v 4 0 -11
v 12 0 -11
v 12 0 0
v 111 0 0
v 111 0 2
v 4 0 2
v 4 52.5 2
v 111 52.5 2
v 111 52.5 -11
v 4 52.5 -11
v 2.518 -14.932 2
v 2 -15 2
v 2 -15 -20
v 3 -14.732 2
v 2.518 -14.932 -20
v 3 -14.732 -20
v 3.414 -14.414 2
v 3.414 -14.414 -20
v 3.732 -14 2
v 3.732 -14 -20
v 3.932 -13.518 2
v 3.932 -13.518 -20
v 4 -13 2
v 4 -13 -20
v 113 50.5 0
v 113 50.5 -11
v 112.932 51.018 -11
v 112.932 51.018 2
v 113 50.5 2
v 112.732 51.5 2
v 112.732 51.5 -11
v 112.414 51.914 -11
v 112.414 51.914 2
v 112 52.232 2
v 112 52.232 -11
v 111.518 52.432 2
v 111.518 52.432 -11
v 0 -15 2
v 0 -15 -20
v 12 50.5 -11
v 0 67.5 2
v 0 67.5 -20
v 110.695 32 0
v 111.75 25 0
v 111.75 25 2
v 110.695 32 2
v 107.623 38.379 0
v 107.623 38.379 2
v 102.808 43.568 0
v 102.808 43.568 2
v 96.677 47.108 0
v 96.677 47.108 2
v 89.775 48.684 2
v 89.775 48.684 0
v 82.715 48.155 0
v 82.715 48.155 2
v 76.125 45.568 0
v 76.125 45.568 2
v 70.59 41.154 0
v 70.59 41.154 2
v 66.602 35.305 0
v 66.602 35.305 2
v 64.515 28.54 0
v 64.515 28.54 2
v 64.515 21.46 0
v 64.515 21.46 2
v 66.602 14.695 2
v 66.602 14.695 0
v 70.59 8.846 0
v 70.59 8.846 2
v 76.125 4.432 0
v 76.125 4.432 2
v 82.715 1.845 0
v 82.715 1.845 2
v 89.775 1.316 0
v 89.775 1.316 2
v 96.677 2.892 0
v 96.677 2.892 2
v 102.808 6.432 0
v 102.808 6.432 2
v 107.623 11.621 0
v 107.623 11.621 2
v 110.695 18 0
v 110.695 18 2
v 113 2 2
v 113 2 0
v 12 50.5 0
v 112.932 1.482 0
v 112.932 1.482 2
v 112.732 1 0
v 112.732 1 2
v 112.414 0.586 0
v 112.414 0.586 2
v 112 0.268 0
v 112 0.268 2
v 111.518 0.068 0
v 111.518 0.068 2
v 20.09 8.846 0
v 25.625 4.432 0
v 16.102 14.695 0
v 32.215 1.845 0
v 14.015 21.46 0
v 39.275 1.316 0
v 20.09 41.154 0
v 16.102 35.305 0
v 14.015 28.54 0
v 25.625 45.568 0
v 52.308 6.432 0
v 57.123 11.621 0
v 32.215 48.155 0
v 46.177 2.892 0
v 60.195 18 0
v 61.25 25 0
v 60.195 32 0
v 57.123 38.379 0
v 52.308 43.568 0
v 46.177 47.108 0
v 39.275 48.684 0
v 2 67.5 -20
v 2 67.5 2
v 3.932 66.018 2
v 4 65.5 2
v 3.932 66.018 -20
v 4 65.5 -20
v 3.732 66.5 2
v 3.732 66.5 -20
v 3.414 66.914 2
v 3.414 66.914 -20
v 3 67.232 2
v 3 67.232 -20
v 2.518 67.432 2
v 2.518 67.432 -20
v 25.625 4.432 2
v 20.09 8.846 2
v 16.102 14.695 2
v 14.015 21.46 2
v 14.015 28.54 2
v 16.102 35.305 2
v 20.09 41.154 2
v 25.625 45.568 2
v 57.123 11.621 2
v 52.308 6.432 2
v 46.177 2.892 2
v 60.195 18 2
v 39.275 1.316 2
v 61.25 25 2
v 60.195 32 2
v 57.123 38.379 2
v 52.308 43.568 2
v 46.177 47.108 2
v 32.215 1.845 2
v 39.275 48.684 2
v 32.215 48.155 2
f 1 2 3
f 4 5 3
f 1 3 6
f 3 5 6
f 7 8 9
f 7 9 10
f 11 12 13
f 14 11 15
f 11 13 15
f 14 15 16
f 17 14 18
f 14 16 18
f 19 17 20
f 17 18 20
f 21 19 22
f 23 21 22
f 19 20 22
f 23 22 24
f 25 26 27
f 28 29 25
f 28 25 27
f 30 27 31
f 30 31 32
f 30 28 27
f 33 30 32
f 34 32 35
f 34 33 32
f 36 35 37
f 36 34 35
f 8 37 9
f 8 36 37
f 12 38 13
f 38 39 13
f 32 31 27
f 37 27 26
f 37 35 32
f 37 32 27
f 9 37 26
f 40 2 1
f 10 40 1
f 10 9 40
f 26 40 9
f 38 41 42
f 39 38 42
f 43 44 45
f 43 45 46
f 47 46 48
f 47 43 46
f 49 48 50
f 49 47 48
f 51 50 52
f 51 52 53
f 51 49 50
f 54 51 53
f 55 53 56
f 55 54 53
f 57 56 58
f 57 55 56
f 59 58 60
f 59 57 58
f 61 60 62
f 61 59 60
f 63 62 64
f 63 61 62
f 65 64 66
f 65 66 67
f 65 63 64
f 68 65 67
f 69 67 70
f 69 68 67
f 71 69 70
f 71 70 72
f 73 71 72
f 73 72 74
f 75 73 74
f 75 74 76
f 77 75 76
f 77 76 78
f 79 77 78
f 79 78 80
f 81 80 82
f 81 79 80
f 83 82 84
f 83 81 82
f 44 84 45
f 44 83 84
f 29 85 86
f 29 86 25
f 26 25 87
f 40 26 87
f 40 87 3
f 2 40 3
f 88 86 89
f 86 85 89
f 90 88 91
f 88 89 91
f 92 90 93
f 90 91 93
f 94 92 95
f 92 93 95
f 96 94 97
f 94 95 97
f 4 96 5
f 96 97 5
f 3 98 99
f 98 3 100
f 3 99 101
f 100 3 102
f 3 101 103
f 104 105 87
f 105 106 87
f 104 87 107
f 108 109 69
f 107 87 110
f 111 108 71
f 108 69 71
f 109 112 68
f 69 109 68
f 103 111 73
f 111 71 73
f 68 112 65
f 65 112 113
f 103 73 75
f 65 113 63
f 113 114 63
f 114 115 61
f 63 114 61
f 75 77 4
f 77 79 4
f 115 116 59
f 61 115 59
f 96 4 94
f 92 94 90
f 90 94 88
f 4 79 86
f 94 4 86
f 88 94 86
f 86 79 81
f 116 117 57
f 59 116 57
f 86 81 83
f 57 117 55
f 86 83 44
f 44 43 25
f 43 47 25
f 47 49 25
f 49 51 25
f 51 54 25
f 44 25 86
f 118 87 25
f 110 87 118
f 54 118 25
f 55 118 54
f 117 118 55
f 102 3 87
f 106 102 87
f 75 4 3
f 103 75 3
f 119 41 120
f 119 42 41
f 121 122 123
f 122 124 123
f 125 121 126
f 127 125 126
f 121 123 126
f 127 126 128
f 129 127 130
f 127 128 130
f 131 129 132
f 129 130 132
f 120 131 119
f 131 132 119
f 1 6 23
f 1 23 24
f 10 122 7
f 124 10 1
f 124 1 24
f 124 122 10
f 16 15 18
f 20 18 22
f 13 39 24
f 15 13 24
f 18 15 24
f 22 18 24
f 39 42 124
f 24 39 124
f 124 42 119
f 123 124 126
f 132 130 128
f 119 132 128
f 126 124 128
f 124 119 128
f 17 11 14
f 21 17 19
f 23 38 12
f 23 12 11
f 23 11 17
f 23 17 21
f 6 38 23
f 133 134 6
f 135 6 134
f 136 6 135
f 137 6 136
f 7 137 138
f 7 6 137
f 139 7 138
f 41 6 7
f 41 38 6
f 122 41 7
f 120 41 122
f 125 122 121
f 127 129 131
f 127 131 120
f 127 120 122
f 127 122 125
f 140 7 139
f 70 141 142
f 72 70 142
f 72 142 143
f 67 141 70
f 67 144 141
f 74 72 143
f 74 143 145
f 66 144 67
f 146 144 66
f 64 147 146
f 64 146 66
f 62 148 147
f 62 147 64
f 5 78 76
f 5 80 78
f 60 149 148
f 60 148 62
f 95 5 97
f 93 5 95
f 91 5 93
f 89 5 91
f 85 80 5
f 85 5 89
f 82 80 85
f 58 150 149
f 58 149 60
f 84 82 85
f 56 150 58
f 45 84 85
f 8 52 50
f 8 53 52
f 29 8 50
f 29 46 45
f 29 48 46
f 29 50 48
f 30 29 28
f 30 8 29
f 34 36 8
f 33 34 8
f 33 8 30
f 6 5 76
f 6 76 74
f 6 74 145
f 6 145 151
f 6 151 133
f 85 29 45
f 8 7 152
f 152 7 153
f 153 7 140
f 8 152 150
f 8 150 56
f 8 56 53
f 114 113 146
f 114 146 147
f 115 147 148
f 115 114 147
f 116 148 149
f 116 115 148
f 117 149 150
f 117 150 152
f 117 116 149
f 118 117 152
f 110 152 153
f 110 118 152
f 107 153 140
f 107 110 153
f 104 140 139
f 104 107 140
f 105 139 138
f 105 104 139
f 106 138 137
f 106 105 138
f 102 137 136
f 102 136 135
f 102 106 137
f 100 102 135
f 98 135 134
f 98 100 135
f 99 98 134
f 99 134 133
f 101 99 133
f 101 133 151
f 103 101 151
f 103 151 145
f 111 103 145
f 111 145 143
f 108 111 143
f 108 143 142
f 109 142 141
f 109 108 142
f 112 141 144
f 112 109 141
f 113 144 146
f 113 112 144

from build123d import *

# Parameters (mm, degrees)
SKETCH_1_W           = 113
SKETCH_1_H           = 52.5
SKETCH_1_R           = 23.75
EXTRUDE_1_DEPTH      = 2
SKETCH_2_W           = 113
SKETCH_2_H           = 2
EXTRUDE_2_DEPTH      = 11
FILLET_1_R           = 2
SKETCH_3_W           = 4
SKETCH_3_H           = 52.5
EXTRUDE_3_DEPTH      = 20
EXTRUDE_4_DEPTH      = 11
SKETCH_5_W           = 4
SKETCH_5_H           = 22
EXTRUDE_5_DEPTH      = 15
EXTRUDE_5_DEPTH_BACK = 67.5
FILLET_2_R           = 2


with BuildPart() as part:
    # 스케치1 → 보스-돌출1 (new body)
    with BuildSketch(Plane.XY):
        with Locations((56.5, 26.25)):
            Rectangle(SKETCH_1_W, SKETCH_1_H)
        with Locations((88, 25)):
            Circle(SKETCH_1_R, mode=Mode.SUBTRACT)
        with Locations((37.5, 25)):
            Circle(SKETCH_1_R, mode=Mode.SUBTRACT)
    extrude(amount=EXTRUDE_1_DEPTH)

    # 스케치2 → 보스-돌출2 (add)
    with BuildSketch(Plane(origin=(0, 0, 0), x_dir=(-1, 0, 0), z_dir=(0, 0, -1))):
        with Locations((-56.5, 51.5)):
            Rectangle(SKETCH_2_W, SKETCH_2_H)
    extrude(amount=EXTRUDE_2_DEPTH)

    # 필렛1
    fillet_1_edges = [part.edges().sort_by_distance(p)[0] for p in [
        (113, 0, 1),
        (113, 52.5, -4.5),
    ]]
    fillet(fillet_1_edges, radius=FILLET_1_R)

    # 스케치3 → 보스-돌출3 (add)
    with BuildSketch(Plane(origin=(0, 0, 0), x_dir=(-1, 0, 0), z_dir=(0, 0, -1))):
        with Locations((-2, 26.25)):
            Rectangle(SKETCH_3_W, SKETCH_3_H)
    extrude(amount=EXTRUDE_3_DEPTH)

    # 스케치4 → 보스-돌출4 (add)
    with BuildSketch(Plane(origin=(0, 0, 0), x_dir=(-1, 0, 0), z_dir=(0, 0, -1))):
        Polygon((-4, 0), (-4, 50.5), (-12, 50.5), (-12, 25), (-12, 0), align=None)
    extrude(amount=EXTRUDE_4_DEPTH)

    # 스케치5 → 보스-돌출5 (add, two sides)
    with BuildSketch(Plane(origin=(0, 52.5, 0), x_dir=(1, 0, 0), z_dir=(0, 1, 0))) as extrude_5_sk:
        with Locations((2, 9)):
            Rectangle(SKETCH_5_W, SKETCH_5_H)
    extrude(amount=EXTRUDE_5_DEPTH)
    extrude(extrude_5_sk.sketch, amount=-EXTRUDE_5_DEPTH_BACK)

    # 필렛2
    fillet_2_edges = [part.edges().sort_by_distance(p)[0] for p in [
        (4, -15, -9),
        (4, 67.5, -9),
    ]]
    fillet(fillet_2_edges, radius=FILLET_2_R)


solid = part.part
